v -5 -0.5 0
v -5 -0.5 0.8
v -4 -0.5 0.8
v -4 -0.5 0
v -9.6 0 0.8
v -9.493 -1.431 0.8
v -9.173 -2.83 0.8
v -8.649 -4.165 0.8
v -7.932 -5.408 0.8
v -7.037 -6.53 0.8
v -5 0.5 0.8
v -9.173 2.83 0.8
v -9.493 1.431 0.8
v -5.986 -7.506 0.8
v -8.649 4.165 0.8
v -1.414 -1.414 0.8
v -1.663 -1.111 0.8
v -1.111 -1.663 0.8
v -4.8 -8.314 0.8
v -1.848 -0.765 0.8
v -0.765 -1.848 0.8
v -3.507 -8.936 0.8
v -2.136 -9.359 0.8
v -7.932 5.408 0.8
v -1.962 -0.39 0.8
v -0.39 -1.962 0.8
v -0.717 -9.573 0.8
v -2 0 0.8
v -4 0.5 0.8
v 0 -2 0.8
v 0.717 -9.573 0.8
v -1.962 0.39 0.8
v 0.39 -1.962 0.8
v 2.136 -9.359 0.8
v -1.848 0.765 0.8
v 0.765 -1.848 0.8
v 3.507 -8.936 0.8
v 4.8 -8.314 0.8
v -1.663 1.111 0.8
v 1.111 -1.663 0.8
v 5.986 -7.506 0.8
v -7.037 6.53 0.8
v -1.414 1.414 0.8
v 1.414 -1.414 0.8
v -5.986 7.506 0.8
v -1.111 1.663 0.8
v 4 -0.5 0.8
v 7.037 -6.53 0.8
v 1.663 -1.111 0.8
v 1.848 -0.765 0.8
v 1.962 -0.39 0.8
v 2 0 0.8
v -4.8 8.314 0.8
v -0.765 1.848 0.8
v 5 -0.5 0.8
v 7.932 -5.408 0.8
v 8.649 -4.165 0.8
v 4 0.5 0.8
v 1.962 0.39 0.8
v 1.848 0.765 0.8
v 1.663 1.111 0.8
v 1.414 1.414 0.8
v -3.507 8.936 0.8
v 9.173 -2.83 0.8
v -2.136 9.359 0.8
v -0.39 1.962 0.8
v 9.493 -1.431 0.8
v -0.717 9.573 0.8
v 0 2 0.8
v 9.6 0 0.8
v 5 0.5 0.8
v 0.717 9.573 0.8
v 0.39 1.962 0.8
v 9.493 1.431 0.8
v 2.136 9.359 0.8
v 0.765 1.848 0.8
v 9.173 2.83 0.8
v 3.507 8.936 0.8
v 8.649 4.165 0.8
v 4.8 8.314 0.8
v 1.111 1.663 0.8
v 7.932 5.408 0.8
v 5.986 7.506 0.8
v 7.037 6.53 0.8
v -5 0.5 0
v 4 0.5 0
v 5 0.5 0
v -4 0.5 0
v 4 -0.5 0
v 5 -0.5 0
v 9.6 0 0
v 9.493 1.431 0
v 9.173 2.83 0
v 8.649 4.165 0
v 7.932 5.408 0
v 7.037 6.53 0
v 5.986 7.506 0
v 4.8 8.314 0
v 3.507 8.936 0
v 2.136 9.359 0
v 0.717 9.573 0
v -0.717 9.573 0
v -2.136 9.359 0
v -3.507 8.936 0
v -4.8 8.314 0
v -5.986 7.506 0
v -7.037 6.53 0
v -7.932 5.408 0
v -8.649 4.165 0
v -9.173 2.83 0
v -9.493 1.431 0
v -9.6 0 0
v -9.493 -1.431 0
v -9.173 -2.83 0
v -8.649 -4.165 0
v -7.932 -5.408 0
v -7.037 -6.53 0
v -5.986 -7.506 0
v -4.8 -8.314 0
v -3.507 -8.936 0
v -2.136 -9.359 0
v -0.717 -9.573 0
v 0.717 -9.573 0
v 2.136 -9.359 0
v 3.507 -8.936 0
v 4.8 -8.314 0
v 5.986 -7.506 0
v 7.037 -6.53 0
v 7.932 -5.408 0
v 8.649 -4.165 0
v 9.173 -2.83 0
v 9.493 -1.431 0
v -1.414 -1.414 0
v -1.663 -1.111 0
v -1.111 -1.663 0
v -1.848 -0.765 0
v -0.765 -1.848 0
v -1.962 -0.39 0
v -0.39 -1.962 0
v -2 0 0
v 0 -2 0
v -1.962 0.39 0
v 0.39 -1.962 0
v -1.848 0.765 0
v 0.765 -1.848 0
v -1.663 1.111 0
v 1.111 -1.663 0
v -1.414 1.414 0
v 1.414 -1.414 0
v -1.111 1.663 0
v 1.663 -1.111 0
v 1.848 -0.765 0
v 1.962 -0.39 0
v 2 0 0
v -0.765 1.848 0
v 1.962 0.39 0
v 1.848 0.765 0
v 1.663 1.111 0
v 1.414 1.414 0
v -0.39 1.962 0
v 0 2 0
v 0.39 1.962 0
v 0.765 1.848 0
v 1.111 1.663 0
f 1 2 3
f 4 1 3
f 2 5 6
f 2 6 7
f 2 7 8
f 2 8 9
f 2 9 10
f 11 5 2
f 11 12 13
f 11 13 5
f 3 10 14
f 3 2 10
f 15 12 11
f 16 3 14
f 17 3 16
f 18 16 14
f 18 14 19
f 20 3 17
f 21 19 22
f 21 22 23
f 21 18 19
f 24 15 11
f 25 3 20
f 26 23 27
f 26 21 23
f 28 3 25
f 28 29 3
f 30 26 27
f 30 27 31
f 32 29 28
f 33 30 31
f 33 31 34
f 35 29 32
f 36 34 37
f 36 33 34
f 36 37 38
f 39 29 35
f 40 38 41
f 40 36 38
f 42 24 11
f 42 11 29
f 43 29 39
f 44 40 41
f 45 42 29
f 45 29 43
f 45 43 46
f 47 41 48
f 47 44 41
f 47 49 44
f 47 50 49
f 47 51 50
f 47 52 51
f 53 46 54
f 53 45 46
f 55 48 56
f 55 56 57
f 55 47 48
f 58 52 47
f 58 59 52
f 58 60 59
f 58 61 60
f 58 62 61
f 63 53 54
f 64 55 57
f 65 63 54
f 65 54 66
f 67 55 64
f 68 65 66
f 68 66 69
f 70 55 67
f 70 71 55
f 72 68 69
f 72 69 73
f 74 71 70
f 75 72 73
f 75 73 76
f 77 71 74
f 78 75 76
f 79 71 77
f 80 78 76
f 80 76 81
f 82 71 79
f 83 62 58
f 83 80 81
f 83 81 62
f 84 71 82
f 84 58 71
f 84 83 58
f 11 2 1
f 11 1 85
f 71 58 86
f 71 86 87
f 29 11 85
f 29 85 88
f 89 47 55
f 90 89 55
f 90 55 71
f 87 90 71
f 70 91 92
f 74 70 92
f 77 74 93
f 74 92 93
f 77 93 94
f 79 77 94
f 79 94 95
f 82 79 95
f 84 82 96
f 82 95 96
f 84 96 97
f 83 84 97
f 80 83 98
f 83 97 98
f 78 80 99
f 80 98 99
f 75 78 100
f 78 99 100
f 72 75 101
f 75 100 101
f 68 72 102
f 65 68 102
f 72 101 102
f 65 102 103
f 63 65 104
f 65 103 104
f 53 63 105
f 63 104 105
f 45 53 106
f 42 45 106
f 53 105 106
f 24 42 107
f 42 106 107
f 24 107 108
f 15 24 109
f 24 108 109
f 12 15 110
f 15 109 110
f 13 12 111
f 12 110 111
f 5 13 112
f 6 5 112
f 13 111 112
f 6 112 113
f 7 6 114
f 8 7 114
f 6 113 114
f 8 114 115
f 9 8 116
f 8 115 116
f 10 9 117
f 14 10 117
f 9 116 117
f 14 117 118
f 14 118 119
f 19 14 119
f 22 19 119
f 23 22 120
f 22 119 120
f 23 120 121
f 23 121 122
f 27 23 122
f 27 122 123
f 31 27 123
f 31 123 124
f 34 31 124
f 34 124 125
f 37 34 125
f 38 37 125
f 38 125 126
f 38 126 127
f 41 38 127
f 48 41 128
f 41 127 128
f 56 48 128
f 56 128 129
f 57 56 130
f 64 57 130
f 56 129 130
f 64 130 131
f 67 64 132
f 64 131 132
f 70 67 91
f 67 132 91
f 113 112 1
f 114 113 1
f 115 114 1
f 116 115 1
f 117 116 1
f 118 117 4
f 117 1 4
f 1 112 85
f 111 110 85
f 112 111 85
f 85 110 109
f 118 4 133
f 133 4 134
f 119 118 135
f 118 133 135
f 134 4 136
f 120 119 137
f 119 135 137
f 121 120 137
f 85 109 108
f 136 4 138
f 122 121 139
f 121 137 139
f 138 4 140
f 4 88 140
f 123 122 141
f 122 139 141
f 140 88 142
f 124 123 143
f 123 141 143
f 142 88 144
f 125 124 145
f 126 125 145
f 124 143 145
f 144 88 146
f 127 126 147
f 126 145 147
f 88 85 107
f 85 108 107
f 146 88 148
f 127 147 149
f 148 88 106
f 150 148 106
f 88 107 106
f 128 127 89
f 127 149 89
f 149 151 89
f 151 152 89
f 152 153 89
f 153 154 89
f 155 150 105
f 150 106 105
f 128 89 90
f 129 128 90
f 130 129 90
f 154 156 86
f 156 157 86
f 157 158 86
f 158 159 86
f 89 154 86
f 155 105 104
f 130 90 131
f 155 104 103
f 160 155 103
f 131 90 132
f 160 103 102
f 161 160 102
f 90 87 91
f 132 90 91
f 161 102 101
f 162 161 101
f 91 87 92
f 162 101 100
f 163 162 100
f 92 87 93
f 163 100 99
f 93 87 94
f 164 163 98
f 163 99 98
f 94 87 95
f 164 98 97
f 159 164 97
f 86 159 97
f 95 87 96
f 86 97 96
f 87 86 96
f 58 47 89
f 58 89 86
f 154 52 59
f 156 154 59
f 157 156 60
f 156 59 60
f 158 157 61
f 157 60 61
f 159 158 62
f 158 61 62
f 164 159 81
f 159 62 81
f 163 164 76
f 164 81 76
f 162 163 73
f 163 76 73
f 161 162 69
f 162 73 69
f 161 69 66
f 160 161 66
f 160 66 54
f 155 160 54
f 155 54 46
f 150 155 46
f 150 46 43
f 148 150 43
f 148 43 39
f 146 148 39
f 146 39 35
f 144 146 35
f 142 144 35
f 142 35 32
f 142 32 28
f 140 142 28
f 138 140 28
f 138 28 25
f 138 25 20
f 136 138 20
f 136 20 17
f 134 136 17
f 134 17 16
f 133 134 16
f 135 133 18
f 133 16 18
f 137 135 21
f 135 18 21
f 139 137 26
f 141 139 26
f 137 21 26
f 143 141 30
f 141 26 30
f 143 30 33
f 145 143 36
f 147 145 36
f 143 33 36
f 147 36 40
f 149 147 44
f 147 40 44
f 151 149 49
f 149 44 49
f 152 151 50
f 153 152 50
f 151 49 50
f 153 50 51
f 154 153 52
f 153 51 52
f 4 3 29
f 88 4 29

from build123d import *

# Parameters (mm, degrees)
SKETCH1_R               = 9.6
BOSS_EXTRUDE1_DEPTH     = 0.8
CUT_EXTRUDE4_START      = 0.8
SKETCH3_R               = 2
SKETCH3_W               = 1
SKETCH3_H               = 1
CUT_EXTRUDE4_DEPTH      = 1.8
CUT_EXTRUDE4_DEPTH_BACK = 1.8


with BuildPart() as part:
    # Sketch1 → Boss-Extrude1 (new body)
    with BuildSketch(Plane.XY):
        Circle(SKETCH1_R)
    extrude(amount=BOSS_EXTRUDE1_DEPTH)

    # Sketch3 → Cut-Extrude4 (cut, two sides)
    with BuildSketch(Plane.XY.offset(CUT_EXTRUDE4_START)) as cut_extrude4_sk:
        Circle(SKETCH3_R)
        with Locations((-4.5, 0)):
            Rectangle(SKETCH3_W, SKETCH3_H)
        with Locations((4.5, 0)):
            Rectangle(SKETCH3_W, SKETCH3_H)
    extrude(amount=CUT_EXTRUDE4_DEPTH, mode=Mode.SUBTRACT)
    extrude(cut_extrude4_sk.sketch, amount=-CUT_EXTRUDE4_DEPTH_BACK, mode=Mode.SUBTRACT)


solid = part.part
